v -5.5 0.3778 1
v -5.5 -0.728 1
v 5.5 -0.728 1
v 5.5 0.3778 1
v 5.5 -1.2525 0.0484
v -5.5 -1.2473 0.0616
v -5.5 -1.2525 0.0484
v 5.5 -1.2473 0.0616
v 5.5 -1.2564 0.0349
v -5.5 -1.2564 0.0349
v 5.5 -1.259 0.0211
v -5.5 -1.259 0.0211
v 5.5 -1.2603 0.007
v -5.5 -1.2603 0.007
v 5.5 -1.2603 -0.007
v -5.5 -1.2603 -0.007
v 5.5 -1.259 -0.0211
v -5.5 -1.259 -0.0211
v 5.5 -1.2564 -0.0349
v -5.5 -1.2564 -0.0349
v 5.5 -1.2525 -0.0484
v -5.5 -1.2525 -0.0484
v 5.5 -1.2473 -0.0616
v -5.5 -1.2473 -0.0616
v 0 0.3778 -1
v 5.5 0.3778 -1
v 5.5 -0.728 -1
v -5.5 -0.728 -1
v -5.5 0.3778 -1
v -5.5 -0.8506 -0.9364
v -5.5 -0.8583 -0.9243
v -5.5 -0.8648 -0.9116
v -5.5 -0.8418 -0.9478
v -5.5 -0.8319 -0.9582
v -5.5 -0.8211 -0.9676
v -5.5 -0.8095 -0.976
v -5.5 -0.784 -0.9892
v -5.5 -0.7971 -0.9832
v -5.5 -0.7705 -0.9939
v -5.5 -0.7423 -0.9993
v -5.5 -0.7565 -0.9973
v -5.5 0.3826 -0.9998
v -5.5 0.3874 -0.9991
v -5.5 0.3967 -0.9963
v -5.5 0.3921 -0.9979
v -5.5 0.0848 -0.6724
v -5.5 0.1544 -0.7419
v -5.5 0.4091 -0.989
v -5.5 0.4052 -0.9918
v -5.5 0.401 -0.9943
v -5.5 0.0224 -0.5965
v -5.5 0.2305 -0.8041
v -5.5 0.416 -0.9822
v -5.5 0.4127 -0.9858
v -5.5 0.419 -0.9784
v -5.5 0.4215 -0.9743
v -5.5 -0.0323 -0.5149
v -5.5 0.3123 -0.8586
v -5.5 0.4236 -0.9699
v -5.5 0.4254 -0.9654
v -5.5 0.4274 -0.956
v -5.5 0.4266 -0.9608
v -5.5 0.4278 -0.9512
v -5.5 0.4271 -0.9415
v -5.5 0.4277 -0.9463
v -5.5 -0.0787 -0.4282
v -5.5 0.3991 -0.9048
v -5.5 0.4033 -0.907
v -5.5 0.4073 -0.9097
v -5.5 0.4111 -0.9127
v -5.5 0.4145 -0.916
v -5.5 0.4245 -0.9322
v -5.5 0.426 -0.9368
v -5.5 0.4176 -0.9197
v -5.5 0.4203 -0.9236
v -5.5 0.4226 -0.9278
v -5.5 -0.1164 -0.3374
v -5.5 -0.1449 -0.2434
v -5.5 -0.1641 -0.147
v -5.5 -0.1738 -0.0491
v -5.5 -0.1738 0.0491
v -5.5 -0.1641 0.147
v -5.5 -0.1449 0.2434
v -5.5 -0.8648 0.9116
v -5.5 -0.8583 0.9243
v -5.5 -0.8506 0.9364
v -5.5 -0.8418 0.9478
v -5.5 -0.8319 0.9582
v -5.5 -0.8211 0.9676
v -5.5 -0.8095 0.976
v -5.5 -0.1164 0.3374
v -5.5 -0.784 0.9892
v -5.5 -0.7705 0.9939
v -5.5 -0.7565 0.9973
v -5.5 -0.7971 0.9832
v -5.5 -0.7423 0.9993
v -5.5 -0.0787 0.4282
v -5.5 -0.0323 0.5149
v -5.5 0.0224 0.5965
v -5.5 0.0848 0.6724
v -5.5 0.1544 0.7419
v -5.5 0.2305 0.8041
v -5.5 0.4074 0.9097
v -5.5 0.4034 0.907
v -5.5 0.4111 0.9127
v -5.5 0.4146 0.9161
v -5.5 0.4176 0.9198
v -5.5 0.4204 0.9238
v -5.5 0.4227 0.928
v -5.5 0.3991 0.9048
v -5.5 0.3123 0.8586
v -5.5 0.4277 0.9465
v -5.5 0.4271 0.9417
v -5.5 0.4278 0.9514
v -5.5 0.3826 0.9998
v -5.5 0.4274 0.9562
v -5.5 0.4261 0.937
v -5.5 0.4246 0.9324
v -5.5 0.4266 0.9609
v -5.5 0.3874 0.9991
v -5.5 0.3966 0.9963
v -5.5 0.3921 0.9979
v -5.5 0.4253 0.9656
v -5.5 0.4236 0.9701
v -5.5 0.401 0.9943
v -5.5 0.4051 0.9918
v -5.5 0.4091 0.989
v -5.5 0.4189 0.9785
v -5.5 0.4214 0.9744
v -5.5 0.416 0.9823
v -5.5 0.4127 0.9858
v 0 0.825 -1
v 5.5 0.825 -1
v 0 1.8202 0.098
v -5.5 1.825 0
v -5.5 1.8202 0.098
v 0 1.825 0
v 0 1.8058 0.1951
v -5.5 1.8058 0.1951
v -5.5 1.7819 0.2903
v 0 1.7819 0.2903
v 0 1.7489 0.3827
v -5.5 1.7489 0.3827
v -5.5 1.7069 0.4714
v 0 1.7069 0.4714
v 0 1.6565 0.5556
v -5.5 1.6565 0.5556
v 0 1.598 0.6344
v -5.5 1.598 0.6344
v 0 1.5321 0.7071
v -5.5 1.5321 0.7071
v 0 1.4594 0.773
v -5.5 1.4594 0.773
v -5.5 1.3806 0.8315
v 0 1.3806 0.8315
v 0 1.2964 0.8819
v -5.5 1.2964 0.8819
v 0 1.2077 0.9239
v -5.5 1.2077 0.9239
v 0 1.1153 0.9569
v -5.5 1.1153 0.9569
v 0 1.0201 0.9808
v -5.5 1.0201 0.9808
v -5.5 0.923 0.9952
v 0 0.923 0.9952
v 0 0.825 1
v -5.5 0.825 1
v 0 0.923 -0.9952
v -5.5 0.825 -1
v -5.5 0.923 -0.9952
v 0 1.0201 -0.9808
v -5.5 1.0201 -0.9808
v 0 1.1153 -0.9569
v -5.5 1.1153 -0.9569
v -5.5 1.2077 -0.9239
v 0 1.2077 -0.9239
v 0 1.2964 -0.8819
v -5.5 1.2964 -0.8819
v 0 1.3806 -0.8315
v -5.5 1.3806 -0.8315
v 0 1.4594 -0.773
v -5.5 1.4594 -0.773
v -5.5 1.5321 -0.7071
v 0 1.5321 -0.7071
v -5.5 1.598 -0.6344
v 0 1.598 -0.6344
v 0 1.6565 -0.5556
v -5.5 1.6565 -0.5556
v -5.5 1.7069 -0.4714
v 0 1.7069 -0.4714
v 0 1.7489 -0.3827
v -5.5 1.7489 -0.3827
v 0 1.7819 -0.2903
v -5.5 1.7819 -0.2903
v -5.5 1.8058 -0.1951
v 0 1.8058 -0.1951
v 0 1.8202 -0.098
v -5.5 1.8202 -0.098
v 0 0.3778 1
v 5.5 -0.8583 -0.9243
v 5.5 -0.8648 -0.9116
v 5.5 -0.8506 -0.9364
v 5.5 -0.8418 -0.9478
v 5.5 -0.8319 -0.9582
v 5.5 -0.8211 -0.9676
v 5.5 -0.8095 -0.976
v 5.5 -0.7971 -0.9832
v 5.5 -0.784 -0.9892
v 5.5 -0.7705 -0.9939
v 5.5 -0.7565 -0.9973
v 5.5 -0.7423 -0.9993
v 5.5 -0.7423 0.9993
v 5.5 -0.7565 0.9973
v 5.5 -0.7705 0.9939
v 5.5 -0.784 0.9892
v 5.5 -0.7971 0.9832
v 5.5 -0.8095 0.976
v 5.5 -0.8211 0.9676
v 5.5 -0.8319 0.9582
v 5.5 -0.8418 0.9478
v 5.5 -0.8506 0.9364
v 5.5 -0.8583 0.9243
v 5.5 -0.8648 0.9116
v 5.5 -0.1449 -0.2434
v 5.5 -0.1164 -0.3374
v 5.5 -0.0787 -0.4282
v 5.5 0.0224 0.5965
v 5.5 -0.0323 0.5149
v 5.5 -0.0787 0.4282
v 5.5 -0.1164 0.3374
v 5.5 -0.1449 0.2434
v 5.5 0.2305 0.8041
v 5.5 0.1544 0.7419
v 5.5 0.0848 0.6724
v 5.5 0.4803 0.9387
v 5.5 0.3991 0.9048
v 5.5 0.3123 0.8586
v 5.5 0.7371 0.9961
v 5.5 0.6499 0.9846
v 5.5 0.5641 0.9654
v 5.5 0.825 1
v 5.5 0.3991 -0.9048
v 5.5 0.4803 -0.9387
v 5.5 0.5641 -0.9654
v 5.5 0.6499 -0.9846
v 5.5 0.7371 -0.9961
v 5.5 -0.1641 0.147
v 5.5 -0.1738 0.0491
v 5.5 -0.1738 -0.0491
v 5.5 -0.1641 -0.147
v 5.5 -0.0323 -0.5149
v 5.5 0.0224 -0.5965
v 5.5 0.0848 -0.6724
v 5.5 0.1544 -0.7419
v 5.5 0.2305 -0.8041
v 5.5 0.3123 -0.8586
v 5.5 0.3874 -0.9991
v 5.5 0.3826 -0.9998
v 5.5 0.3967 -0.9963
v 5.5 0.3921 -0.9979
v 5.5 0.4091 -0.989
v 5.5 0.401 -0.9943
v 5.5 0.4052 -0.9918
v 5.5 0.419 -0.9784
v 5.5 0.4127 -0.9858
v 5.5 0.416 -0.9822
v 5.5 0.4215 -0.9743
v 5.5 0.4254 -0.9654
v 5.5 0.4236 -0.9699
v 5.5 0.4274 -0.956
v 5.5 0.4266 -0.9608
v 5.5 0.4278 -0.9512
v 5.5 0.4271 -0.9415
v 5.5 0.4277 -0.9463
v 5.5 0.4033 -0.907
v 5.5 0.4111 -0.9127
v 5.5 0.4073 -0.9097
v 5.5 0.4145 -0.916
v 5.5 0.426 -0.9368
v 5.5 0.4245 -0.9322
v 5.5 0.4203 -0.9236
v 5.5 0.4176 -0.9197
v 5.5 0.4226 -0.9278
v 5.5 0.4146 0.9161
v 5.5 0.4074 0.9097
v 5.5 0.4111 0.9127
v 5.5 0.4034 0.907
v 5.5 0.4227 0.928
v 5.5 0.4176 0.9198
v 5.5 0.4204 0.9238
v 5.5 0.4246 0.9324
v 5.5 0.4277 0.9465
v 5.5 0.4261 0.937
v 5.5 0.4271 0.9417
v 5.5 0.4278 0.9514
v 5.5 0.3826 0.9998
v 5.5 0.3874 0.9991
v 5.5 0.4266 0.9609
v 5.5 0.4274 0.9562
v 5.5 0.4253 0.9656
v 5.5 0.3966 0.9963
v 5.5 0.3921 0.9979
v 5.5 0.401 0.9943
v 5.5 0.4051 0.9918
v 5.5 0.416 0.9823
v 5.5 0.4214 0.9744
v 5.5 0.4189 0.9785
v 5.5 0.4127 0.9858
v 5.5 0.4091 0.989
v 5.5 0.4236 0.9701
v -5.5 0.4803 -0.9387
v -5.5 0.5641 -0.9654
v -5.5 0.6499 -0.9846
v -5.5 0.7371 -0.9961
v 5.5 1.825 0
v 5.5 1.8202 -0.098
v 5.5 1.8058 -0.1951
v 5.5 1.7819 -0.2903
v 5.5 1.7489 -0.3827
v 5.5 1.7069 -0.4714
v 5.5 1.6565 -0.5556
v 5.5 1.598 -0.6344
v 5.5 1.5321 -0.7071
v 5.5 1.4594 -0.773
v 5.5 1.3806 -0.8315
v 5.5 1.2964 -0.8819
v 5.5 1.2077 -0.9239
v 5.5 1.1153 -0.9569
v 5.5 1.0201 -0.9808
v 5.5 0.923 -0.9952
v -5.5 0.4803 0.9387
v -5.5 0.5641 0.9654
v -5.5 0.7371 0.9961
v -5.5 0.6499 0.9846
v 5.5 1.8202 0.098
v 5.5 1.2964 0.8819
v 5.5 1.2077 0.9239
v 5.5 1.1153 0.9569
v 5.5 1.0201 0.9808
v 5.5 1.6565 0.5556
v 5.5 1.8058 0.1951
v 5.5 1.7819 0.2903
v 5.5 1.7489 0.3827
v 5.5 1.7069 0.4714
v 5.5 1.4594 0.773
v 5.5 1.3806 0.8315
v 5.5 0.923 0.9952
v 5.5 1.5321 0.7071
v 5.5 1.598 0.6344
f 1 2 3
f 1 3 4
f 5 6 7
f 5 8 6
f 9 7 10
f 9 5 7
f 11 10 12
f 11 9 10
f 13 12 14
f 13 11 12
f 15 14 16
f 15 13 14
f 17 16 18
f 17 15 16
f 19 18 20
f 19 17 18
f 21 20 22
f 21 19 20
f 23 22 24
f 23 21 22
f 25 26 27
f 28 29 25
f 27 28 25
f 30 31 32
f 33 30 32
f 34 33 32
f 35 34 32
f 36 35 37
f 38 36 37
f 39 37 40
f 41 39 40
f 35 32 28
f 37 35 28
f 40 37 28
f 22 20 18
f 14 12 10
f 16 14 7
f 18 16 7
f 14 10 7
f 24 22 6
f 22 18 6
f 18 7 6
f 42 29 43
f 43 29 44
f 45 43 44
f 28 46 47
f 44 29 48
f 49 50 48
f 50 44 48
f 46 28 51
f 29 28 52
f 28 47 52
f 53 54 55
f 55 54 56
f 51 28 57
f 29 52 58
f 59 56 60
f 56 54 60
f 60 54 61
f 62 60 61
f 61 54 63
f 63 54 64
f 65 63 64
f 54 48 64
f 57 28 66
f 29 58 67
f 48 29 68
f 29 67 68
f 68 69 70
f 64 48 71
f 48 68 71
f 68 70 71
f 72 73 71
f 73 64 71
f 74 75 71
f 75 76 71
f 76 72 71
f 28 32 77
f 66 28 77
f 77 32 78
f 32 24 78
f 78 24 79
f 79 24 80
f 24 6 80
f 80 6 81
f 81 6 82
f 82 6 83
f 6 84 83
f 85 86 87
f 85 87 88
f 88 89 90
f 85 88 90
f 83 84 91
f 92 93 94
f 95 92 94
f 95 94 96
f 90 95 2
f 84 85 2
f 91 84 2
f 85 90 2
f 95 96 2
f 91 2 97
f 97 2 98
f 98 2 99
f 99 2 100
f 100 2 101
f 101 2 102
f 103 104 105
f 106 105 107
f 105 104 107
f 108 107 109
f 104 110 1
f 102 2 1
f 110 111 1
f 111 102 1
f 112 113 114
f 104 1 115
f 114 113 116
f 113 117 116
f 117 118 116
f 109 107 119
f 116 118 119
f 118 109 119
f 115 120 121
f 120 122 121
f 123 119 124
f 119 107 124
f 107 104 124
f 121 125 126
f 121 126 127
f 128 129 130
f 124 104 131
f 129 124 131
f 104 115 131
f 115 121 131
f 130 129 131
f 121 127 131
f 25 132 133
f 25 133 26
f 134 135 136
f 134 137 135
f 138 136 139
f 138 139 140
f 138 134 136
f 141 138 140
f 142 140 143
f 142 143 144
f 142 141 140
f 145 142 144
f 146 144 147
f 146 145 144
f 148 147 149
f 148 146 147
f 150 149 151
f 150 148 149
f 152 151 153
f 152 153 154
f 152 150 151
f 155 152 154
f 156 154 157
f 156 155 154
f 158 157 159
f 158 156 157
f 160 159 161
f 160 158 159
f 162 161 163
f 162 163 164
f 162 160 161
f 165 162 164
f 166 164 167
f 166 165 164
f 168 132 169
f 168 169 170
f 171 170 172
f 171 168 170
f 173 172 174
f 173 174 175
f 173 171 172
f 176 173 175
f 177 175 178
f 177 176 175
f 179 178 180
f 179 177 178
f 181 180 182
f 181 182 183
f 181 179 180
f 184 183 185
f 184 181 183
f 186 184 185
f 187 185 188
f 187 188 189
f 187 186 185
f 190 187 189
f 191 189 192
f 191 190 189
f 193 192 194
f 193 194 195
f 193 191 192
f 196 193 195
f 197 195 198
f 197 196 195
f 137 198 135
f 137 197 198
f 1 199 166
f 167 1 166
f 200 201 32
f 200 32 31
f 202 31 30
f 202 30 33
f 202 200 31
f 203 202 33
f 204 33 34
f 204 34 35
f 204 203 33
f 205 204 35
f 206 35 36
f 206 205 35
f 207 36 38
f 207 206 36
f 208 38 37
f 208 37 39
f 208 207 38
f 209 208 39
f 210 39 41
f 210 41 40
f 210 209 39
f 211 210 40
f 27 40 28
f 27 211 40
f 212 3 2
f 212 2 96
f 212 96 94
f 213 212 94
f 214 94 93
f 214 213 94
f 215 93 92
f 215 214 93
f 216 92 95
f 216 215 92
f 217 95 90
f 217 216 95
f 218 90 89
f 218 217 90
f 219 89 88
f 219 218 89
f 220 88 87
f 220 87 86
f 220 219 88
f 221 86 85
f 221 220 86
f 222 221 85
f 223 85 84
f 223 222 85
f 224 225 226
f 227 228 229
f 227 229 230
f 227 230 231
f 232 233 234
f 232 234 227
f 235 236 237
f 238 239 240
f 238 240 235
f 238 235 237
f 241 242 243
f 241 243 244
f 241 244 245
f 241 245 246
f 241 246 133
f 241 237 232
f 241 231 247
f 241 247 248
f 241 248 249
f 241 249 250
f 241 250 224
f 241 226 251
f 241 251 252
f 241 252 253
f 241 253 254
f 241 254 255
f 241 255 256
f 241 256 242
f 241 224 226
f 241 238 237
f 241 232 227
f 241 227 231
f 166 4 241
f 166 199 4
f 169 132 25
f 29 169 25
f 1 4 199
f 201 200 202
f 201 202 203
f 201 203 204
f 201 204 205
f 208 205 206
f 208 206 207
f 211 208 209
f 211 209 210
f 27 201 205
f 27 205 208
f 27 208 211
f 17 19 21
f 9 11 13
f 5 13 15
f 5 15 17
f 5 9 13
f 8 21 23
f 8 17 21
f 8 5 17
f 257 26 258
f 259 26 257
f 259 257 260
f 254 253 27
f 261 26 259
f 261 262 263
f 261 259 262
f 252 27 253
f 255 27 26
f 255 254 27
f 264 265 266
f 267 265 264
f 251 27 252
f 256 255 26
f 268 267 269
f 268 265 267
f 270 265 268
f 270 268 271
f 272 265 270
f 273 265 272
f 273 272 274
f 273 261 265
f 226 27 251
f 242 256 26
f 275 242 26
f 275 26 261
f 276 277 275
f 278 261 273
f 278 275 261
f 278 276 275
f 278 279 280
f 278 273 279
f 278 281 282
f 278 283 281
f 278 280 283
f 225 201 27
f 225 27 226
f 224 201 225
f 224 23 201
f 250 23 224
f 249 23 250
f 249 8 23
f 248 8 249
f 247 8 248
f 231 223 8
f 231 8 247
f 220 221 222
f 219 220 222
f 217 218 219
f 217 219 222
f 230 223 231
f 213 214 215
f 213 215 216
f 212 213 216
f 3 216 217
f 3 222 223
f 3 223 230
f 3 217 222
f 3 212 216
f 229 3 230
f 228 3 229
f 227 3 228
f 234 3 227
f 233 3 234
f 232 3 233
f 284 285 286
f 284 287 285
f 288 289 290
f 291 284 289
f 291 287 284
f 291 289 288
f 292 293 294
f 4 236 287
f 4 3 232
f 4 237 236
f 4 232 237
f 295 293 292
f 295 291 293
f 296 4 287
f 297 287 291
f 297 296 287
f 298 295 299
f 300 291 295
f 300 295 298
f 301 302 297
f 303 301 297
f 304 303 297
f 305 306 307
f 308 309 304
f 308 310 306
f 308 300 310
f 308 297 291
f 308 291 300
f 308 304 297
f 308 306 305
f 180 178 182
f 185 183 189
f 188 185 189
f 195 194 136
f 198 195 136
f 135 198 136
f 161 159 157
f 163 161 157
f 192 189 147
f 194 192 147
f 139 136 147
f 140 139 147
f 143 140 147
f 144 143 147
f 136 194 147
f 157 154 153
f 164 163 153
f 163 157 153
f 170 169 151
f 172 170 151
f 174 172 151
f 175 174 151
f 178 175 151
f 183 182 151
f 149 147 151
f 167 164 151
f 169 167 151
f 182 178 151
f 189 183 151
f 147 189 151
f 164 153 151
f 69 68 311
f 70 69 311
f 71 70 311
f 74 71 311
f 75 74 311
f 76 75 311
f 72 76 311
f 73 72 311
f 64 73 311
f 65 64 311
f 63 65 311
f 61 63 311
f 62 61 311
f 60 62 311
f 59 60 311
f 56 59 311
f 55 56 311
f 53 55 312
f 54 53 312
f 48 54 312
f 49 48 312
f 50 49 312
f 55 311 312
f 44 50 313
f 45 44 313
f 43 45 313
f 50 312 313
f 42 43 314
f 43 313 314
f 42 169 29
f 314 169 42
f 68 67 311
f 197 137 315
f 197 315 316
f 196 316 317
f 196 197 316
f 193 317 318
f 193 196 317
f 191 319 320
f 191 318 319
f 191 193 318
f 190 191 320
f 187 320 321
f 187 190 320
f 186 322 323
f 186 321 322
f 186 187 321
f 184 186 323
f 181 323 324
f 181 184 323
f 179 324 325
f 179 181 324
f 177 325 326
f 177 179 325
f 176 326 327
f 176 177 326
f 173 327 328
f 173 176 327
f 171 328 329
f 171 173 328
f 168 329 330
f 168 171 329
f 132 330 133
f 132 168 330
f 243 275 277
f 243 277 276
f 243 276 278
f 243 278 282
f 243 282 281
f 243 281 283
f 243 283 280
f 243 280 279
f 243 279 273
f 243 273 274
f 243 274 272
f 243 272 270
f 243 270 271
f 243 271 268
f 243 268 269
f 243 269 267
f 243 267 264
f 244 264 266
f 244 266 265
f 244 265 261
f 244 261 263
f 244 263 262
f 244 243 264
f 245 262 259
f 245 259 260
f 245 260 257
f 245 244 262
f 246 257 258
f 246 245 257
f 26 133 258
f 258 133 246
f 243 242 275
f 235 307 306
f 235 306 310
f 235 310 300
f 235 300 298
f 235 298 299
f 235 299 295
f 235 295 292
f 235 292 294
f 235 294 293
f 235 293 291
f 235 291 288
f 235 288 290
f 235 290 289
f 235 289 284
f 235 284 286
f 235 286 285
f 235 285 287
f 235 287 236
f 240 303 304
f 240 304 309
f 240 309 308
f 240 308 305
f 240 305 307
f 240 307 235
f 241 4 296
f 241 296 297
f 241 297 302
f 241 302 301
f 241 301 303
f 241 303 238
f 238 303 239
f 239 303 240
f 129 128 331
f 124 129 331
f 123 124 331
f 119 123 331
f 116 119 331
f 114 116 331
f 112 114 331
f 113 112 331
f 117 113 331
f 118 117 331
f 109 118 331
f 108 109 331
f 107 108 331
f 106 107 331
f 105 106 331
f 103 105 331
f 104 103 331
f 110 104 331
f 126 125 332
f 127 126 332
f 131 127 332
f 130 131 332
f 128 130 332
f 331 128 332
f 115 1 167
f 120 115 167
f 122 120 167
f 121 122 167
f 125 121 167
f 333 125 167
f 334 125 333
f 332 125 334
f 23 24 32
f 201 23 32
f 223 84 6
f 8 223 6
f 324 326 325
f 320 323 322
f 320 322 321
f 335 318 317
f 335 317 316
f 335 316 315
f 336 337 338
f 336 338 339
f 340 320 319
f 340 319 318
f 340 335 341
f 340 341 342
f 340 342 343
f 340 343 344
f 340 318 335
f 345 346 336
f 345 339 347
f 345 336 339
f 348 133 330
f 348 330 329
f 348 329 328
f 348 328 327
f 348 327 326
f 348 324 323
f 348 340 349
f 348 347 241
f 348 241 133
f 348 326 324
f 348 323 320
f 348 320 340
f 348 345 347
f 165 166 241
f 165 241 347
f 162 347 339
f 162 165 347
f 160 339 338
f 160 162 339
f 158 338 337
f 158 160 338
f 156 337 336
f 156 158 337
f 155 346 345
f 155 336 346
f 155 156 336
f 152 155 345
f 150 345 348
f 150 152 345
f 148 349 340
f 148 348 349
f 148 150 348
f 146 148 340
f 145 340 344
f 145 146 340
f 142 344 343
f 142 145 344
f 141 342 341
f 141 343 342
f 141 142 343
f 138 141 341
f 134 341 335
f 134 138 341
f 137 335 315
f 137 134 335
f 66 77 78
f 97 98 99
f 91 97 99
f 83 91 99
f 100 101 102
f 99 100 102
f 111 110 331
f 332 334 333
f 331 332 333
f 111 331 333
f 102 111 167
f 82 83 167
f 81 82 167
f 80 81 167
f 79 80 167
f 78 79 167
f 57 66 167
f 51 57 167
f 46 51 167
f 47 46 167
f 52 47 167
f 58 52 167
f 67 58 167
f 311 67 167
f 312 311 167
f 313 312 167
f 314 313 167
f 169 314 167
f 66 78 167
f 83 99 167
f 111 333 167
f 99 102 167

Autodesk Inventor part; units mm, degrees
ref_plane "YZ Plane" through (0, 0, 0) normal (1, 0, 0) x (0, 1, 0)
ref_plane "XZ Plane" through (0, 0, 0) normal (0, 1, 0) x (-1, 0, 0)
ref_plane "XY Plane" through (0, 0, 0) normal (0, 0, 1) x (1, 0, 0)
sketch "Sketch1" plane through (0, 0, 0) normal (1, 0, 0) x (0, 1, 0)
  line L0 (-0.825, 1) -> (0.825, 1)
  line L1 (0.825, -1) -> (-0.825, -1)
  line L2 (-0.825, -1) -> (-0.825, 1) construction
  line L3 (-0.825, 1) -> (0.825, -1) construction
  line L4 (0.825, 1) -> (-0.825, -1) construction
  arc A0 (0.825, 1) -> (0.825, -1) centre (0.825, 0) ccw
  line L5 (-0.825, 1) -> (-1.275, 0)
  line L6 (-1.275, 0) -> (-0.825, -1)
  point P0 (0, 0)
  dimension "d0" = 2
  dimension "d1" = 1.65
  dimension "d9" = 2.1
extrude "Extrusion1" add sketch "Sketch1" along normal mid plane 11
fillet "Fillet1" radius 0.05 2 edges at (0, 0.825, 1) (0, 0.825, -1)
fillet "Fillet1" radius 0.15 3 edges at (0, -0.825, -1) (0, -0.825, 1) (0, -1.275, 0)
sketch "Sketch2" plane through (0, 0, 0) normal (1, 0, 0) x (0, 1, 0)
  arc A0 (0.825, 1) -> (0.825, -1) centre (0.825, 0) ccw projected
  circle A1 centre (0.825, 0) radius 1
  line L0 (-0.728, 1) -> (0.3778, 1) projected
  line L1 (0.3778, 1) -> (0.825, 1)
  line L2 (0.825, 1) -> (0.825, -1)
  line L3 (-0.728, -1) -> (0.3778, -1) projected
  line L4 (0.825, -1) -> (0.3778, -1)
  arc A2 (-1.2473, 0.0616) -> (-1.2473, -0.0616) centre (-1.1105, 0) ccw projected
  line L5 (-1.2473, -0.0616) -> (-0.8648, -0.9116) projected
  arc A3 (-0.8648, -0.9116) -> (-0.728, -1) centre (-0.728, -0.85) ccw projected
  line L6 (-0.728, -1) -> (0.3778, -1) projected
  arc A4 (0.3778, -1) -> (0.3991, -0.9048) centre (0.3778, -0.95) ccw projected
  arc A5 (0.3991, 0.9048) -> (0.3991, -0.9048) centre (0.825, 0) ccw projected
  arc A6 (0.3991, 0.9048) -> (0.3778, 1) centre (0.3778, 0.95) ccw projected
  line L7 (0.3778, 1) -> (-0.728, 1) projected
  arc A7 (-0.728, 1) -> (-0.8648, 0.9116) centre (-0.728, 0.85) ccw projected
  line L8 (-0.8648, 0.9116) -> (-1.2473, 0.0616) projected
  point P0 (0, 0)
  point P1 (0.825, 1)
  point P2 (0.3991, 0.9048)
  point P3 (0.3991, -0.9048)
  point P4 (0.3778, -1)
extrude "graphite" add sketch "Sketch2" along normal mid plane 11 contours L2 A0 | A0 A6 L1 | A1 L2 | L4 A4 A0
properties part number "ApexSeal"
